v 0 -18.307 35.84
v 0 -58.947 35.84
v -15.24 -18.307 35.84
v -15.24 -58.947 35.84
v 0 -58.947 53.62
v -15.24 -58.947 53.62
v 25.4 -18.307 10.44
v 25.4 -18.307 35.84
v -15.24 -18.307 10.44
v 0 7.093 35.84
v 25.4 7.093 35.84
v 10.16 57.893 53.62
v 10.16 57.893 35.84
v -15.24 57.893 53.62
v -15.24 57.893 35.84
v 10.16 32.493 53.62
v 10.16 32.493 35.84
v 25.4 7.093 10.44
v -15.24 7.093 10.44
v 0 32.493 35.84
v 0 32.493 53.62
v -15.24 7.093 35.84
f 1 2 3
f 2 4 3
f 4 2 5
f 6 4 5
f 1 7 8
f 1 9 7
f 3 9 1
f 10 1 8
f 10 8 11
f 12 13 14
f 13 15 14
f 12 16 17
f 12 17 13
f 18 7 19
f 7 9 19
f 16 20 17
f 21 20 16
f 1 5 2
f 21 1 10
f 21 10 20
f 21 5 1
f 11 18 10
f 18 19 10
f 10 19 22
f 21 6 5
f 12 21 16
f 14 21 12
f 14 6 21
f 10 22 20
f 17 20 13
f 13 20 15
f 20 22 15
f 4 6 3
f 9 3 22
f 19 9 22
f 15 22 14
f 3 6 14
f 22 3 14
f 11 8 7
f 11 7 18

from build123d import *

# Parameters (mm, degrees)
F0_W     = 116.84
F0_H     = 17.78
F1_DEPTH = 15.24
F2_W     = 25.4
F2_H     = 17.78
F3_DEPTH = 10.16
F4_W     = 15.24
F4_H     = 25.4
F5_DEPTH = 25.4
F6_W     = 25.4
F6_H     = 25.4
F7_DEPTH = 25.4


with BuildPart() as f1:
    # F0 (on Right) → F1 (new body)
    with BuildSketch(Plane.YZ):
        with Locations((-0.526623, 44.730002)):
            Rectangle(F0_W, F0_H)
    extrude(amount=-F1_DEPTH)

    # F2 (on face) → F3 (join)
    with BuildSketch(Plane.YZ):
        with Locations((45.193377, 44.730002)):
            Rectangle(F2_W, F2_H)
    extrude(amount=F3_DEPTH)

    # F4 (on face) → F5 (join)
    with BuildSketch(Plane(origin=(0, 0, 35.840002), x_dir=(1, 0, 0), z_dir=(0, 0, -1))):
        with Locations((-7.62, 5.606623)):
            Rectangle(F4_W, F4_H)
    extrude(amount=F5_DEPTH)

    # F6 (on face) → F7 (join)
    with BuildSketch(Plane.YZ):
        with Locations((-5.606623, 23.140002)):
            Rectangle(F6_W, F6_H)
    extrude(amount=F7_DEPTH)


solid = f1.part
